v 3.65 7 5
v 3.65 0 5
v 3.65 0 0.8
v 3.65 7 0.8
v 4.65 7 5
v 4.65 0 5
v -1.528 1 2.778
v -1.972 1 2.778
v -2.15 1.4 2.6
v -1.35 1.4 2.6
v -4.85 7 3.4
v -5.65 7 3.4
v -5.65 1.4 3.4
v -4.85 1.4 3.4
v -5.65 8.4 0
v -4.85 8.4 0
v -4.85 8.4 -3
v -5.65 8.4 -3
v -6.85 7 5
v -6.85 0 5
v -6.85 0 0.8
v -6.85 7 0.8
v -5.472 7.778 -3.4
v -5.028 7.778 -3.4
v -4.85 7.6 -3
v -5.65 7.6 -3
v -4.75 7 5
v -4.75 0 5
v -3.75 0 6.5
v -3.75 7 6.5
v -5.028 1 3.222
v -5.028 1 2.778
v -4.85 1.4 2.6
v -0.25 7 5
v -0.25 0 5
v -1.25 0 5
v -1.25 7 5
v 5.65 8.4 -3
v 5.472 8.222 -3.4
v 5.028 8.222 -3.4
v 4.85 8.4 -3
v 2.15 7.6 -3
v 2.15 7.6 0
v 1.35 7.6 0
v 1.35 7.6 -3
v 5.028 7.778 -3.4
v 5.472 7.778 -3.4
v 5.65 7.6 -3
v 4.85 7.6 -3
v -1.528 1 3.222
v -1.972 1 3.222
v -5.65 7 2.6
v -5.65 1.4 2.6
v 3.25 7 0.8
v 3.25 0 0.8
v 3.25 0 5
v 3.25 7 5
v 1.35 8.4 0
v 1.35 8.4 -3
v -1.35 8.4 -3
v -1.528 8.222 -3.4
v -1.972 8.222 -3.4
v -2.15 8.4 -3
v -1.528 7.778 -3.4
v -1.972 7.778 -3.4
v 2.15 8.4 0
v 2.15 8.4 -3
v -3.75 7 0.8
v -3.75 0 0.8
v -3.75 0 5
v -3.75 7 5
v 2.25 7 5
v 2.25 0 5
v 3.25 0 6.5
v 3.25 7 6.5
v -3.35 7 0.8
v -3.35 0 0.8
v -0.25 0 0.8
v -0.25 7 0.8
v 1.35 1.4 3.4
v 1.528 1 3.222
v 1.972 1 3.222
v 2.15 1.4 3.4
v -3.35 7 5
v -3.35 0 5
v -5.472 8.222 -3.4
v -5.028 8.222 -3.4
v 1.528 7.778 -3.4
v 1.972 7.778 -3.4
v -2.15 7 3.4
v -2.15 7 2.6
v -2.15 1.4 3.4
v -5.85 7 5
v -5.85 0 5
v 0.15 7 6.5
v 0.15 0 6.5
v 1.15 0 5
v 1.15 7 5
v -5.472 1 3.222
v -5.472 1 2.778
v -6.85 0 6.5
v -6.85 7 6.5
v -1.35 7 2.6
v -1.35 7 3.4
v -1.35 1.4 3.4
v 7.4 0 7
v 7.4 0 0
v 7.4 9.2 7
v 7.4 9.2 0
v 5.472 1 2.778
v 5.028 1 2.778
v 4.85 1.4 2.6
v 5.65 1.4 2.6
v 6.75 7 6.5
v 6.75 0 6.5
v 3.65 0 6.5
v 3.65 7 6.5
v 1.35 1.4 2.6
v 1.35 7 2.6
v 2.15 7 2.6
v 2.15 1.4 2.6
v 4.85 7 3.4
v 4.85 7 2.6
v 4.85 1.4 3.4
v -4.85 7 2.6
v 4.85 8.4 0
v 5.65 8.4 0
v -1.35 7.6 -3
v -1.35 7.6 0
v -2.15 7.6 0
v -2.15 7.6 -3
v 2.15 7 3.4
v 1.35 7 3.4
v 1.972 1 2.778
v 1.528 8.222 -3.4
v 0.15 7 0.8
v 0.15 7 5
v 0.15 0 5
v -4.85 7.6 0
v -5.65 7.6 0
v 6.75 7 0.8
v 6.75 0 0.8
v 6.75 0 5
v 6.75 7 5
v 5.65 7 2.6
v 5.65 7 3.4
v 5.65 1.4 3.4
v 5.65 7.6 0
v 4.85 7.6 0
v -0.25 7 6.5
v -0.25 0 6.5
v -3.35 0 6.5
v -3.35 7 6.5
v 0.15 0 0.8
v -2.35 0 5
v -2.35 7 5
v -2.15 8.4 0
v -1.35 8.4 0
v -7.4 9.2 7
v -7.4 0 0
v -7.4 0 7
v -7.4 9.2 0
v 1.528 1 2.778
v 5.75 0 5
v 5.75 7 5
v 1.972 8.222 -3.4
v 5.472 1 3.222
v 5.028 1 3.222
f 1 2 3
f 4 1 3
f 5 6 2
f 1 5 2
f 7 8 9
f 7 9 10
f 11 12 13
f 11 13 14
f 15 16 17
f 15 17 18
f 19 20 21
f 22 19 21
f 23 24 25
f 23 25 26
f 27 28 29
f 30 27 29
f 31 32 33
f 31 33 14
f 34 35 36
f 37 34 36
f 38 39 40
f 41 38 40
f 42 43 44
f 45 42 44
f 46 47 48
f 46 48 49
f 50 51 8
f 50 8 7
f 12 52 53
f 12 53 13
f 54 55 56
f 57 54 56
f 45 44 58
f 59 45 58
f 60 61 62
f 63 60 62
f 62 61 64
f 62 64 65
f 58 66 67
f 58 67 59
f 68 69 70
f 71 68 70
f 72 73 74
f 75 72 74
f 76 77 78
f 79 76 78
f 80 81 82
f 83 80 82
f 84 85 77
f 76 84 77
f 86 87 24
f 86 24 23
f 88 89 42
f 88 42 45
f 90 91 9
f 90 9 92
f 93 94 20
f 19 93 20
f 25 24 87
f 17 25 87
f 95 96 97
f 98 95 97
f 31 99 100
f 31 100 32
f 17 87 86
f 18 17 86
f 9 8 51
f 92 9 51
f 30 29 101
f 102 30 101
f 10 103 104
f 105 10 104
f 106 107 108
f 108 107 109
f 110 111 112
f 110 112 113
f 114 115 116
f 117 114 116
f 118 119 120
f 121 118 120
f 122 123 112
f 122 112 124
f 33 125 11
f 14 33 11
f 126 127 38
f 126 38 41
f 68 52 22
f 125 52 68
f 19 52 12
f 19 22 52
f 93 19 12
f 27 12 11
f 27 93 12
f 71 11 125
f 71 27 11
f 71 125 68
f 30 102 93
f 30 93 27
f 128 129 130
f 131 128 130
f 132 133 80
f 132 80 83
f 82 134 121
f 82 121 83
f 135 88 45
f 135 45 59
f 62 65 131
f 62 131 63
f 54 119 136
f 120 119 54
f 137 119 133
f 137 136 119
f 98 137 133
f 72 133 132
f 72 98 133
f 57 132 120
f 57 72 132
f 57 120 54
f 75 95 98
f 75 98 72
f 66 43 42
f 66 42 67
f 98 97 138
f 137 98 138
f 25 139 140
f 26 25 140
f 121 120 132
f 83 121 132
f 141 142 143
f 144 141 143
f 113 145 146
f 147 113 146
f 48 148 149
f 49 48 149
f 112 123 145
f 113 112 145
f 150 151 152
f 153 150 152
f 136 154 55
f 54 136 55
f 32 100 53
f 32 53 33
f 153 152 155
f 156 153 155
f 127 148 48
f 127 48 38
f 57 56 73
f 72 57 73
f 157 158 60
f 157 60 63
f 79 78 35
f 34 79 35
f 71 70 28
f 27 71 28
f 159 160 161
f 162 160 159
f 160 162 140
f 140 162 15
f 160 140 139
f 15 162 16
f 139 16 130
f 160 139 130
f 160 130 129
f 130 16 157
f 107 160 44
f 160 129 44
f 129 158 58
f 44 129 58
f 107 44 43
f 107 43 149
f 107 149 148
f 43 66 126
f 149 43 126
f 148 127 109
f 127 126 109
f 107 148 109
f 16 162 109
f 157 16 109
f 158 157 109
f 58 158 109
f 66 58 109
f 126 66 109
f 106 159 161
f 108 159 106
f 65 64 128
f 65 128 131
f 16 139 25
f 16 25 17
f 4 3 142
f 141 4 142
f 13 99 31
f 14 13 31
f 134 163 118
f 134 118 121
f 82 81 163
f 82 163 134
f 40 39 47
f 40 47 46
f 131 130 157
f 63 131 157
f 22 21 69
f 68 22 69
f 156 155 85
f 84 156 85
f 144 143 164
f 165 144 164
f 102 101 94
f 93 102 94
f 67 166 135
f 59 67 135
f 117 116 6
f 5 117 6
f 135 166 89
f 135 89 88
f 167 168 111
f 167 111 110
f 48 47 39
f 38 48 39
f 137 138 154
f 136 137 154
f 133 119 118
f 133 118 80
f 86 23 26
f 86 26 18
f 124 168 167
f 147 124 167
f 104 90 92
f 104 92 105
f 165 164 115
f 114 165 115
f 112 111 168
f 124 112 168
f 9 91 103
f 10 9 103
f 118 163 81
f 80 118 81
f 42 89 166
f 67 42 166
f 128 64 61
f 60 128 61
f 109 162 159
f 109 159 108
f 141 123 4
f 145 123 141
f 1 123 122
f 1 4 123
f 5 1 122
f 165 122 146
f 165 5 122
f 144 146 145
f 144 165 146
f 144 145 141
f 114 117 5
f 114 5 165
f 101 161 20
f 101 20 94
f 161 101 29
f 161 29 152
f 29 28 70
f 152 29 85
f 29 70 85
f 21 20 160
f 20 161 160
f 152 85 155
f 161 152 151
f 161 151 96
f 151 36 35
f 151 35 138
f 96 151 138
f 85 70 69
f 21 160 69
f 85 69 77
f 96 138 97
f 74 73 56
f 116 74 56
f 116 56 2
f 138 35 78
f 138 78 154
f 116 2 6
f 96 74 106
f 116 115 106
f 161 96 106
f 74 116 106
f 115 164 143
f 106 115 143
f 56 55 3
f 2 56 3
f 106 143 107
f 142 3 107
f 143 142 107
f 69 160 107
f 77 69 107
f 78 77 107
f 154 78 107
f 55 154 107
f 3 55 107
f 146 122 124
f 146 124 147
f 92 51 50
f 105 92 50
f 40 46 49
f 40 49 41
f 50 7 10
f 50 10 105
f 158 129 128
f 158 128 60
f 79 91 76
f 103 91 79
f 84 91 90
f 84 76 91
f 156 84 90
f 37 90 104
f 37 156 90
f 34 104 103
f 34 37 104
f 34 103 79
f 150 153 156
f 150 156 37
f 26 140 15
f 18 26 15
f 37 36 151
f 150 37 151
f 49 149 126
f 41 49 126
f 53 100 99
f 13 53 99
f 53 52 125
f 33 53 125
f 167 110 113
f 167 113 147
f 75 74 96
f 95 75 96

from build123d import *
from OCP.BRepFilletAPI import BRepFilletAPI_MakeChamfer

# Parameters (mm, degrees)
SKETCH_1_W                          = 14.8
SKETCH_1_H                          = 9.2
EXTRUDE_1_DEPTH                     = 7
SKETCH_2_W                          = 0.8
SKETCH_2_H                          = 0.8
EXTRUDE_2_DEPTH                     = 3.4
CHAMFER_1_SIZE                      = 0.4
CHAMFER_1_SIZE2                     = 0.178091474
CUT_EXTRUDE_1_DEPTH                 = 7
PATTERN_LINEAR_1_COUNT              = 4
PATTERN_LINEAR_1_PITCH              = 3.5
CHAMFER_1_OF_PATTERN_LINEAR_1_SIZE  = 0.4
CHAMFER_1_OF_PATTERN_LINEAR_1_SIZE2 = 0.178091474
PATTERN_LINEAR_2_COUNT              = 4
PATTERN_LINEAR_2_PITCH              = 3.5
SKETCH_4_W                          = 0.8
SKETCH_4_H                          = 0.8
EXTRUDE_3_DEPTH                     = 6
CHAMFER_2_SIZE                      = 0.4
CHAMFER_2_SIZE2                     = 0.178091474
PATTERN_LINEAR_3_COUNT              = 4
PATTERN_LINEAR_3_PITCH              = 3.5
CHAMFER_2_OF_PATTERN_LINEAR_3_SIZE  = 0.4
CHAMFER_2_OF_PATTERN_LINEAR_3_SIZE2 = 0.178091474


with BuildPart() as part:
    # Эскиз1 → Бобышка-Вытянуть1 (new body)
    with BuildSketch(Plane.XY):
        with Locations((0, 4.6)):
            Rectangle(SKETCH_1_W, SKETCH_1_H)
    extrude(amount=EXTRUDE_1_DEPTH)

    # Эскиз2 → Бобышка-Вытянуть2 (add)
    with BuildSketch(Plane(origin=(0, 0, 0), x_dir=(-1, 0, 0), z_dir=(0, 0, -1))):
        with Locations((-5.25, 8)):
            Rectangle(SKETCH_2_W, SKETCH_2_H)
    extrude_2 = extrude(amount=EXTRUDE_2_DEPTH)

    # Фаска1: one chamfer whose edges measure the first distance from different faces: ONE call of the kernel's chamfer builder (chamfer() names one face for all edges)
    chamfer_1_edges_1 = [part.edges().sort_by_distance(p)[0] for p in [
        (4.85, 8, -3.4),
    ]]
    chamfer_1_side_1 = [part.faces().sort_by_distance(p)[0] for p in [
        (4.85, 8, -1.7),
    ]]
    chamfer_1_edges_2 = [part.edges().sort_by_distance(p)[0] for p in [
        (5.25, 8.4, -3.4),
    ]]
    chamfer_1_side_2 = [part.faces().sort_by_distance(p)[0] for p in [
        (5.25, 8.4, -1.7),
    ]]
    chamfer_1_edges_3 = [part.edges().sort_by_distance(p)[0] for p in [
        (5.65, 8, -3.4),
    ]]
    chamfer_1_side_3 = [part.faces().sort_by_distance(p)[0] for p in [
        (5.65, 8, -1.7),
    ]]
    chamfer_1_edges_4 = [part.edges().sort_by_distance(p)[0] for p in [
        (5.25, 7.6, -3.4),
    ]]
    chamfer_1_side_4 = [part.faces().sort_by_distance(p)[0] for p in [
        (5.25, 7.6, -1.7),
    ]]
    chamfer_1 = BRepFilletAPI_MakeChamfer(part.part.solid().wrapped)
    for e in chamfer_1_edges_1:
        chamfer_1.Add(CHAMFER_1_SIZE, CHAMFER_1_SIZE2, e.wrapped, chamfer_1_side_1[0].wrapped)  # the first distance lies on this face
    for e in chamfer_1_edges_2:
        chamfer_1.Add(CHAMFER_1_SIZE, CHAMFER_1_SIZE2, e.wrapped, chamfer_1_side_2[0].wrapped)  # the first distance lies on this face
    for e in chamfer_1_edges_3:
        chamfer_1.Add(CHAMFER_1_SIZE, CHAMFER_1_SIZE2, e.wrapped, chamfer_1_side_3[0].wrapped)  # the first distance lies on this face
    for e in chamfer_1_edges_4:
        chamfer_1.Add(CHAMFER_1_SIZE, CHAMFER_1_SIZE2, e.wrapped, chamfer_1_side_4[0].wrapped)  # the first distance lies on this face
    add(Compound.cast(chamfer_1.Shape()), mode=Mode.REPLACE)

    # Эскиз3 → Вырез-Вытянуть1 (cut)
    with BuildSketch(Plane.XZ):
        Polygon((3.65, 0.8), (6.75, 0.8), (6.75, 5), (5.75, 5), (6.75, 6.5), (3.65, 6.5), (4.65, 5), (3.65, 5), align=None)
    cut_extrude_1 = extrude(amount=-CUT_EXTRUDE_1_DEPTH, mode=Mode.SUBTRACT)

    # Линейный массив1: Бобышка-Вытянуть2 ×4
    with Locations(*[(-i * PATTERN_LINEAR_1_PITCH, 0, 0) for i in range(1, PATTERN_LINEAR_1_COUNT)]):
        add(extrude_2)

    # Фаска1 of Линейный массив1: one chamfer whose edges measure the first distance from different faces: ONE call of the kernel's chamfer builder (chamfer() names one face for all edges)
    chamfer_1_of_pattern_linear_1_edges_1 = [part.edges().sort_by_distance(p)[0] for p in [
        (1.35, 8, -3.4),
    ]]
    chamfer_1_of_pattern_linear_1_side_1 = [part.faces().sort_by_distance(p)[0] for p in [
        (1.35, 8, -1.7),
    ]]
    chamfer_1_of_pattern_linear_1_edges_2 = [part.edges().sort_by_distance(p)[0] for p in [
        (1.75, 8.4, -3.4),
    ]]
    chamfer_1_of_pattern_linear_1_side_2 = [part.faces().sort_by_distance(p)[0] for p in [
        (1.75, 8.4, -1.7),
    ]]
    chamfer_1_of_pattern_linear_1_edges_3 = [part.edges().sort_by_distance(p)[0] for p in [
        (2.15, 8, -3.4),
    ]]
    chamfer_1_of_pattern_linear_1_side_3 = [part.faces().sort_by_distance(p)[0] for p in [
        (2.15, 8, -1.7),
    ]]
    chamfer_1_of_pattern_linear_1_edges_4 = [part.edges().sort_by_distance(p)[0] for p in [
        (1.75, 7.6, -3.4),
    ]]
    chamfer_1_of_pattern_linear_1_side_4 = [part.faces().sort_by_distance(p)[0] for p in [
        (1.75, 7.6, -1.7),
    ]]
    chamfer_1_of_pattern_linear_1_edges_5 = [part.edges().sort_by_distance(p)[0] for p in [
        (-2.15, 8, -3.4),
    ]]
    chamfer_1_of_pattern_linear_1_side_5 = [part.faces().sort_by_distance(p)[0] for p in [
        (-2.15, 8, -1.7),
    ]]
    chamfer_1_of_pattern_linear_1_edges_6 = [part.edges().sort_by_distance(p)[0] for p in [
        (-1.75, 8.4, -3.4),
    ]]
    chamfer_1_of_pattern_linear_1_side_6 = [part.faces().sort_by_distance(p)[0] for p in [
        (-1.75, 8.4, -1.7),
    ]]
    chamfer_1_of_pattern_linear_1_edges_7 = [part.edges().sort_by_distance(p)[0] for p in [
        (-1.35, 8, -3.4),
    ]]
    chamfer_1_of_pattern_linear_1_side_7 = [part.faces().sort_by_distance(p)[0] for p in [
        (-1.35, 8, -1.7),
    ]]
    chamfer_1_of_pattern_linear_1_edges_8 = [part.edges().sort_by_distance(p)[0] for p in [
        (-1.75, 7.6, -3.4),
    ]]
    chamfer_1_of_pattern_linear_1_side_8 = [part.faces().sort_by_distance(p)[0] for p in [
        (-1.75, 7.6, -1.7),
    ]]
    chamfer_1_of_pattern_linear_1_edges_9 = [part.edges().sort_by_distance(p)[0] for p in [
        (-5.65, 8, -3.4),
    ]]
    chamfer_1_of_pattern_linear_1_side_9 = [part.faces().sort_by_distance(p)[0] for p in [
        (-5.65, 8, -1.7),
    ]]
    chamfer_1_of_pattern_linear_1_edges_10 = [part.edges().sort_by_distance(p)[0] for p in [
        (-5.25, 8.4, -3.4),
    ]]
    chamfer_1_of_pattern_linear_1_side_10 = [part.faces().sort_by_distance(p)[0] for p in [
        (-5.25, 8.4, -1.7),
    ]]
    chamfer_1_of_pattern_linear_1_edges_11 = [part.edges().sort_by_distance(p)[0] for p in [
        (-4.85, 8, -3.4),
    ]]
    chamfer_1_of_pattern_linear_1_side_11 = [part.faces().sort_by_distance(p)[0] for p in [
        (-4.85, 8, -1.7),
    ]]
    chamfer_1_of_pattern_linear_1_edges_12 = [part.edges().sort_by_distance(p)[0] for p in [
        (-5.25, 7.6, -3.4),
    ]]
    chamfer_1_of_pattern_linear_1_side_12 = [part.faces().sort_by_distance(p)[0] for p in [
        (-5.25, 7.6, -1.7),
    ]]
    chamfer_1_of_pattern_linear_1 = BRepFilletAPI_MakeChamfer(part.part.solid().wrapped)
    for e in chamfer_1_of_pattern_linear_1_edges_1:
        chamfer_1_of_pattern_linear_1.Add(CHAMFER_1_OF_PATTERN_LINEAR_1_SIZE, CHAMFER_1_OF_PATTERN_LINEAR_1_SIZE2, e.wrapped, chamfer_1_of_pattern_linear_1_side_1[0].wrapped)  # the first distance lies on this face
    for e in chamfer_1_of_pattern_linear_1_edges_2:
        chamfer_1_of_pattern_linear_1.Add(CHAMFER_1_OF_PATTERN_LINEAR_1_SIZE, CHAMFER_1_OF_PATTERN_LINEAR_1_SIZE2, e.wrapped, chamfer_1_of_pattern_linear_1_side_2[0].wrapped)  # the first distance lies on this face
    for e in chamfer_1_of_pattern_linear_1_edges_3:
        chamfer_1_of_pattern_linear_1.Add(CHAMFER_1_OF_PATTERN_LINEAR_1_SIZE, CHAMFER_1_OF_PATTERN_LINEAR_1_SIZE2, e.wrapped, chamfer_1_of_pattern_linear_1_side_3[0].wrapped)  # the first distance lies on this face
    for e in chamfer_1_of_pattern_linear_1_edges_4:
        chamfer_1_of_pattern_linear_1.Add(CHAMFER_1_OF_PATTERN_LINEAR_1_SIZE, CHAMFER_1_OF_PATTERN_LINEAR_1_SIZE2, e.wrapped, chamfer_1_of_pattern_linear_1_side_4[0].wrapped)  # the first distance lies on this face
    for e in chamfer_1_of_pattern_linear_1_edges_5:
        chamfer_1_of_pattern_linear_1.Add(CHAMFER_1_OF_PATTERN_LINEAR_1_SIZE, CHAMFER_1_OF_PATTERN_LINEAR_1_SIZE2, e.wrapped, chamfer_1_of_pattern_linear_1_side_5[0].wrapped)  # the first distance lies on this face
    for e in chamfer_1_of_pattern_linear_1_edges_6:
        chamfer_1_of_pattern_linear_1.Add(CHAMFER_1_OF_PATTERN_LINEAR_1_SIZE, CHAMFER_1_OF_PATTERN_LINEAR_1_SIZE2, e.wrapped, chamfer_1_of_pattern_linear_1_side_6[0].wrapped)  # the first distance lies on this face
    for e in chamfer_1_of_pattern_linear_1_edges_7:
        chamfer_1_of_pattern_linear_1.Add(CHAMFER_1_OF_PATTERN_LINEAR_1_SIZE, CHAMFER_1_OF_PATTERN_LINEAR_1_SIZE2, e.wrapped, chamfer_1_of_pattern_linear_1_side_7[0].wrapped)  # the first distance lies on this face
    for e in chamfer_1_of_pattern_linear_1_edges_8:
        chamfer_1_of_pattern_linear_1.Add(CHAMFER_1_OF_PATTERN_LINEAR_1_SIZE, CHAMFER_1_OF_PATTERN_LINEAR_1_SIZE2, e.wrapped, chamfer_1_of_pattern_linear_1_side_8[0].wrapped)  # the first distance lies on this face
    for e in chamfer_1_of_pattern_linear_1_edges_9:
        chamfer_1_of_pattern_linear_1.Add(CHAMFER_1_OF_PATTERN_LINEAR_1_SIZE, CHAMFER_1_OF_PATTERN_LINEAR_1_SIZE2, e.wrapped, chamfer_1_of_pattern_linear_1_side_9[0].wrapped)  # the first distance lies on this face
    for e in chamfer_1_of_pattern_linear_1_edges_10:
        chamfer_1_of_pattern_linear_1.Add(CHAMFER_1_OF_PATTERN_LINEAR_1_SIZE, CHAMFER_1_OF_PATTERN_LINEAR_1_SIZE2, e.wrapped, chamfer_1_of_pattern_linear_1_side_10[0].wrapped)  # the first distance lies on this face
    for e in chamfer_1_of_pattern_linear_1_edges_11:
        chamfer_1_of_pattern_linear_1.Add(CHAMFER_1_OF_PATTERN_LINEAR_1_SIZE, CHAMFER_1_OF_PATTERN_LINEAR_1_SIZE2, e.wrapped, chamfer_1_of_pattern_linear_1_side_11[0].wrapped)  # the first distance lies on this face
    for e in chamfer_1_of_pattern_linear_1_edges_12:
        chamfer_1_of_pattern_linear_1.Add(CHAMFER_1_OF_PATTERN_LINEAR_1_SIZE, CHAMFER_1_OF_PATTERN_LINEAR_1_SIZE2, e.wrapped, chamfer_1_of_pattern_linear_1_side_12[0].wrapped)  # the first distance lies on this face
    add(Compound.cast(chamfer_1_of_pattern_linear_1.Shape()), mode=Mode.REPLACE)

    # Линейный массив2: Вырез-Вытянуть1 ×4
    with Locations(*[(-i * PATTERN_LINEAR_2_PITCH, 0, 0) for i in range(1, PATTERN_LINEAR_2_COUNT)]):
        add(cut_extrude_1, mode=Mode.SUBTRACT)

    # Эскиз4 → Бобышка-Вытянуть3 (add)
    with BuildSketch(Plane.XZ.offset(-7)):
        with Locations((5.25, 3)):
            Rectangle(SKETCH_4_W, SKETCH_4_H)
    extrude_3 = extrude(amount=EXTRUDE_3_DEPTH)

    # Фаска2: one chamfer whose edges measure the first distance from different faces: ONE call of the kernel's chamfer builder (chamfer() names one face for all edges)
    chamfer_2_edges_1 = [part.edges().sort_by_distance(p)[0] for p in [
        (5.65, 1, 3),
    ]]
    chamfer_2_side_1 = [part.faces().sort_by_distance(p)[0] for p in [
        (5.65, 4, 3),
    ]]
    chamfer_2_edges_2 = [part.edges().sort_by_distance(p)[0] for p in [
        (5.25, 1, 3.4),
    ]]
    chamfer_2_side_2 = [part.faces().sort_by_distance(p)[0] for p in [
        (5.25, 4, 3.4),
    ]]
    chamfer_2_edges_3 = [part.edges().sort_by_distance(p)[0] for p in [
        (4.85, 1, 3),
    ]]
    chamfer_2_side_3 = [part.faces().sort_by_distance(p)[0] for p in [
        (4.85, 4, 3),
    ]]
    chamfer_2_edges_4 = [part.edges().sort_by_distance(p)[0] for p in [
        (5.25, 1, 2.6),
    ]]
    chamfer_2_side_4 = [part.faces().sort_by_distance(p)[0] for p in [
        (5.25, 4, 2.6),
    ]]
    chamfer_2 = BRepFilletAPI_MakeChamfer(part.part.solid().wrapped)
    for e in chamfer_2_edges_1:
        chamfer_2.Add(CHAMFER_2_SIZE, CHAMFER_2_SIZE2, e.wrapped, chamfer_2_side_1[0].wrapped)  # the first distance lies on this face
    for e in chamfer_2_edges_2:
        chamfer_2.Add(CHAMFER_2_SIZE, CHAMFER_2_SIZE2, e.wrapped, chamfer_2_side_2[0].wrapped)  # the first distance lies on this face
    for e in chamfer_2_edges_3:
        chamfer_2.Add(CHAMFER_2_SIZE, CHAMFER_2_SIZE2, e.wrapped, chamfer_2_side_3[0].wrapped)  # the first distance lies on this face
    for e in chamfer_2_edges_4:
        chamfer_2.Add(CHAMFER_2_SIZE, CHAMFER_2_SIZE2, e.wrapped, chamfer_2_side_4[0].wrapped)  # the first distance lies on this face
    add(Compound.cast(chamfer_2.Shape()), mode=Mode.REPLACE)

    # Линейный массив3: Бобышка-Вытянуть3 ×4
    with Locations(*[(-i * PATTERN_LINEAR_3_PITCH, 0, 0) for i in range(1, PATTERN_LINEAR_3_COUNT)]):
        add(extrude_3)

    # Фаска2 of Линейный массив3: one chamfer whose edges measure the first distance from different faces: ONE call of the kernel's chamfer builder (chamfer() names one face for all edges)
    chamfer_2_of_pattern_linear_3_edges_1 = [part.edges().sort_by_distance(p)[0] for p in [
        (2.15, 1, 3),
    ]]
    chamfer_2_of_pattern_linear_3_side_1 = [part.faces().sort_by_distance(p)[0] for p in [
        (2.15, 4, 3),
    ]]
    chamfer_2_of_pattern_linear_3_edges_2 = [part.edges().sort_by_distance(p)[0] for p in [
        (1.75, 1, 3.4),
    ]]
    chamfer_2_of_pattern_linear_3_side_2 = [part.faces().sort_by_distance(p)[0] for p in [
        (1.75, 4, 3.4),
    ]]
    chamfer_2_of_pattern_linear_3_edges_3 = [part.edges().sort_by_distance(p)[0] for p in [
        (1.35, 1, 3),
    ]]
    chamfer_2_of_pattern_linear_3_side_3 = [part.faces().sort_by_distance(p)[0] for p in [
        (1.35, 4, 3),
    ]]
    chamfer_2_of_pattern_linear_3_edges_4 = [part.edges().sort_by_distance(p)[0] for p in [
        (1.75, 1, 2.6),
    ]]
    chamfer_2_of_pattern_linear_3_side_4 = [part.faces().sort_by_distance(p)[0] for p in [
        (1.75, 4, 2.6),
    ]]
    chamfer_2_of_pattern_linear_3_edges_5 = [part.edges().sort_by_distance(p)[0] for p in [
        (-1.35, 1, 3),
    ]]
    chamfer_2_of_pattern_linear_3_side_5 = [part.faces().sort_by_distance(p)[0] for p in [
        (-1.35, 4, 3),
    ]]
    chamfer_2_of_pattern_linear_3_edges_6 = [part.edges().sort_by_distance(p)[0] for p in [
        (-1.75, 1, 3.4),
    ]]
    chamfer_2_of_pattern_linear_3_side_6 = [part.faces().sort_by_distance(p)[0] for p in [
        (-1.75, 4, 3.4),
    ]]
    chamfer_2_of_pattern_linear_3_edges_7 = [part.edges().sort_by_distance(p)[0] for p in [
        (-2.15, 1, 3),
    ]]
    chamfer_2_of_pattern_linear_3_side_7 = [part.faces().sort_by_distance(p)[0] for p in [
        (-2.15, 4, 3),
    ]]
    chamfer_2_of_pattern_linear_3_edges_8 = [part.edges().sort_by_distance(p)[0] for p in [
        (-1.75, 1, 2.6),
    ]]
    chamfer_2_of_pattern_linear_3_side_8 = [part.faces().sort_by_distance(p)[0] for p in [
        (-1.75, 4, 2.6),
    ]]
    chamfer_2_of_pattern_linear_3_edges_9 = [part.edges().sort_by_distance(p)[0] for p in [
        (-4.85, 1, 3),
    ]]
    chamfer_2_of_pattern_linear_3_side_9 = [part.faces().sort_by_distance(p)[0] for p in [
        (-4.85, 4, 3),
    ]]
    chamfer_2_of_pattern_linear_3_edges_10 = [part.edges().sort_by_distance(p)[0] for p in [
        (-5.25, 1, 3.4),
    ]]
    chamfer_2_of_pattern_linear_3_side_10 = [part.faces().sort_by_distance(p)[0] for p in [
        (-5.25, 4, 3.4),
    ]]
    chamfer_2_of_pattern_linear_3_edges_11 = [part.edges().sort_by_distance(p)[0] for p in [
        (-5.65, 1, 3),
    ]]
    chamfer_2_of_pattern_linear_3_side_11 = [part.faces().sort_by_distance(p)[0] for p in [
        (-5.65, 4, 3),
    ]]
    chamfer_2_of_pattern_linear_3_edges_12 = [part.edges().sort_by_distance(p)[0] for p in [
        (-5.25, 1, 2.6),
    ]]
    chamfer_2_of_pattern_linear_3_side_12 = [part.faces().sort_by_distance(p)[0] for p in [
        (-5.25, 4, 2.6),
    ]]
    chamfer_2_of_pattern_linear_3 = BRepFilletAPI_MakeChamfer(part.part.solid().wrapped)
    for e in chamfer_2_of_pattern_linear_3_edges_1:
        chamfer_2_of_pattern_linear_3.Add(CHAMFER_2_OF_PATTERN_LINEAR_3_SIZE, CHAMFER_2_OF_PATTERN_LINEAR_3_SIZE2, e.wrapped, chamfer_2_of_pattern_linear_3_side_1[0].wrapped)  # the first distance lies on this face
    for e in chamfer_2_of_pattern_linear_3_edges_2:
        chamfer_2_of_pattern_linear_3.Add(CHAMFER_2_OF_PATTERN_LINEAR_3_SIZE, CHAMFER_2_OF_PATTERN_LINEAR_3_SIZE2, e.wrapped, chamfer_2_of_pattern_linear_3_side_2[0].wrapped)  # the first distance lies on this face
    for e in chamfer_2_of_pattern_linear_3_edges_3:
        chamfer_2_of_pattern_linear_3.Add(CHAMFER_2_OF_PATTERN_LINEAR_3_SIZE, CHAMFER_2_OF_PATTERN_LINEAR_3_SIZE2, e.wrapped, chamfer_2_of_pattern_linear_3_side_3[0].wrapped)  # the first distance lies on this face
    for e in chamfer_2_of_pattern_linear_3_edges_4:
        chamfer_2_of_pattern_linear_3.Add(CHAMFER_2_OF_PATTERN_LINEAR_3_SIZE, CHAMFER_2_OF_PATTERN_LINEAR_3_SIZE2, e.wrapped, chamfer_2_of_pattern_linear_3_side_4[0].wrapped)  # the first distance lies on this face
    for e in chamfer_2_of_pattern_linear_3_edges_5:
        chamfer_2_of_pattern_linear_3.Add(CHAMFER_2_OF_PATTERN_LINEAR_3_SIZE, CHAMFER_2_OF_PATTERN_LINEAR_3_SIZE2, e.wrapped, chamfer_2_of_pattern_linear_3_side_5[0].wrapped)  # the first distance lies on this face
    for e in chamfer_2_of_pattern_linear_3_edges_6:
        chamfer_2_of_pattern_linear_3.Add(CHAMFER_2_OF_PATTERN_LINEAR_3_SIZE, CHAMFER_2_OF_PATTERN_LINEAR_3_SIZE2, e.wrapped, chamfer_2_of_pattern_linear_3_side_6[0].wrapped)  # the first distance lies on this face
    for e in chamfer_2_of_pattern_linear_3_edges_7:
        chamfer_2_of_pattern_linear_3.Add(CHAMFER_2_OF_PATTERN_LINEAR_3_SIZE, CHAMFER_2_OF_PATTERN_LINEAR_3_SIZE2, e.wrapped, chamfer_2_of_pattern_linear_3_side_7[0].wrapped)  # the first distance lies on this face
    for e in chamfer_2_of_pattern_linear_3_edges_8:
        chamfer_2_of_pattern_linear_3.Add(CHAMFER_2_OF_PATTERN_LINEAR_3_SIZE, CHAMFER_2_OF_PATTERN_LINEAR_3_SIZE2, e.wrapped, chamfer_2_of_pattern_linear_3_side_8[0].wrapped)  # the first distance lies on this face
    for e in chamfer_2_of_pattern_linear_3_edges_9:
        chamfer_2_of_pattern_linear_3.Add(CHAMFER_2_OF_PATTERN_LINEAR_3_SIZE, CHAMFER_2_OF_PATTERN_LINEAR_3_SIZE2, e.wrapped, chamfer_2_of_pattern_linear_3_side_9[0].wrapped)  # the first distance lies on this face
    for e in chamfer_2_of_pattern_linear_3_edges_10:
        chamfer_2_of_pattern_linear_3.Add(CHAMFER_2_OF_PATTERN_LINEAR_3_SIZE, CHAMFER_2_OF_PATTERN_LINEAR_3_SIZE2, e.wrapped, chamfer_2_of_pattern_linear_3_side_10[0].wrapped)  # the first distance lies on this face
    for e in chamfer_2_of_pattern_linear_3_edges_11:
        chamfer_2_of_pattern_linear_3.Add(CHAMFER_2_OF_PATTERN_LINEAR_3_SIZE, CHAMFER_2_OF_PATTERN_LINEAR_3_SIZE2, e.wrapped, chamfer_2_of_pattern_linear_3_side_11[0].wrapped)  # the first distance lies on this face
    for e in chamfer_2_of_pattern_linear_3_edges_12:
        chamfer_2_of_pattern_linear_3.Add(CHAMFER_2_OF_PATTERN_LINEAR_3_SIZE, CHAMFER_2_OF_PATTERN_LINEAR_3_SIZE2, e.wrapped, chamfer_2_of_pattern_linear_3_side_12[0].wrapped)  # the first distance lies on this face
    add(Compound.cast(chamfer_2_of_pattern_linear_3.Shape()), mode=Mode.REPLACE)


solid = part.part
